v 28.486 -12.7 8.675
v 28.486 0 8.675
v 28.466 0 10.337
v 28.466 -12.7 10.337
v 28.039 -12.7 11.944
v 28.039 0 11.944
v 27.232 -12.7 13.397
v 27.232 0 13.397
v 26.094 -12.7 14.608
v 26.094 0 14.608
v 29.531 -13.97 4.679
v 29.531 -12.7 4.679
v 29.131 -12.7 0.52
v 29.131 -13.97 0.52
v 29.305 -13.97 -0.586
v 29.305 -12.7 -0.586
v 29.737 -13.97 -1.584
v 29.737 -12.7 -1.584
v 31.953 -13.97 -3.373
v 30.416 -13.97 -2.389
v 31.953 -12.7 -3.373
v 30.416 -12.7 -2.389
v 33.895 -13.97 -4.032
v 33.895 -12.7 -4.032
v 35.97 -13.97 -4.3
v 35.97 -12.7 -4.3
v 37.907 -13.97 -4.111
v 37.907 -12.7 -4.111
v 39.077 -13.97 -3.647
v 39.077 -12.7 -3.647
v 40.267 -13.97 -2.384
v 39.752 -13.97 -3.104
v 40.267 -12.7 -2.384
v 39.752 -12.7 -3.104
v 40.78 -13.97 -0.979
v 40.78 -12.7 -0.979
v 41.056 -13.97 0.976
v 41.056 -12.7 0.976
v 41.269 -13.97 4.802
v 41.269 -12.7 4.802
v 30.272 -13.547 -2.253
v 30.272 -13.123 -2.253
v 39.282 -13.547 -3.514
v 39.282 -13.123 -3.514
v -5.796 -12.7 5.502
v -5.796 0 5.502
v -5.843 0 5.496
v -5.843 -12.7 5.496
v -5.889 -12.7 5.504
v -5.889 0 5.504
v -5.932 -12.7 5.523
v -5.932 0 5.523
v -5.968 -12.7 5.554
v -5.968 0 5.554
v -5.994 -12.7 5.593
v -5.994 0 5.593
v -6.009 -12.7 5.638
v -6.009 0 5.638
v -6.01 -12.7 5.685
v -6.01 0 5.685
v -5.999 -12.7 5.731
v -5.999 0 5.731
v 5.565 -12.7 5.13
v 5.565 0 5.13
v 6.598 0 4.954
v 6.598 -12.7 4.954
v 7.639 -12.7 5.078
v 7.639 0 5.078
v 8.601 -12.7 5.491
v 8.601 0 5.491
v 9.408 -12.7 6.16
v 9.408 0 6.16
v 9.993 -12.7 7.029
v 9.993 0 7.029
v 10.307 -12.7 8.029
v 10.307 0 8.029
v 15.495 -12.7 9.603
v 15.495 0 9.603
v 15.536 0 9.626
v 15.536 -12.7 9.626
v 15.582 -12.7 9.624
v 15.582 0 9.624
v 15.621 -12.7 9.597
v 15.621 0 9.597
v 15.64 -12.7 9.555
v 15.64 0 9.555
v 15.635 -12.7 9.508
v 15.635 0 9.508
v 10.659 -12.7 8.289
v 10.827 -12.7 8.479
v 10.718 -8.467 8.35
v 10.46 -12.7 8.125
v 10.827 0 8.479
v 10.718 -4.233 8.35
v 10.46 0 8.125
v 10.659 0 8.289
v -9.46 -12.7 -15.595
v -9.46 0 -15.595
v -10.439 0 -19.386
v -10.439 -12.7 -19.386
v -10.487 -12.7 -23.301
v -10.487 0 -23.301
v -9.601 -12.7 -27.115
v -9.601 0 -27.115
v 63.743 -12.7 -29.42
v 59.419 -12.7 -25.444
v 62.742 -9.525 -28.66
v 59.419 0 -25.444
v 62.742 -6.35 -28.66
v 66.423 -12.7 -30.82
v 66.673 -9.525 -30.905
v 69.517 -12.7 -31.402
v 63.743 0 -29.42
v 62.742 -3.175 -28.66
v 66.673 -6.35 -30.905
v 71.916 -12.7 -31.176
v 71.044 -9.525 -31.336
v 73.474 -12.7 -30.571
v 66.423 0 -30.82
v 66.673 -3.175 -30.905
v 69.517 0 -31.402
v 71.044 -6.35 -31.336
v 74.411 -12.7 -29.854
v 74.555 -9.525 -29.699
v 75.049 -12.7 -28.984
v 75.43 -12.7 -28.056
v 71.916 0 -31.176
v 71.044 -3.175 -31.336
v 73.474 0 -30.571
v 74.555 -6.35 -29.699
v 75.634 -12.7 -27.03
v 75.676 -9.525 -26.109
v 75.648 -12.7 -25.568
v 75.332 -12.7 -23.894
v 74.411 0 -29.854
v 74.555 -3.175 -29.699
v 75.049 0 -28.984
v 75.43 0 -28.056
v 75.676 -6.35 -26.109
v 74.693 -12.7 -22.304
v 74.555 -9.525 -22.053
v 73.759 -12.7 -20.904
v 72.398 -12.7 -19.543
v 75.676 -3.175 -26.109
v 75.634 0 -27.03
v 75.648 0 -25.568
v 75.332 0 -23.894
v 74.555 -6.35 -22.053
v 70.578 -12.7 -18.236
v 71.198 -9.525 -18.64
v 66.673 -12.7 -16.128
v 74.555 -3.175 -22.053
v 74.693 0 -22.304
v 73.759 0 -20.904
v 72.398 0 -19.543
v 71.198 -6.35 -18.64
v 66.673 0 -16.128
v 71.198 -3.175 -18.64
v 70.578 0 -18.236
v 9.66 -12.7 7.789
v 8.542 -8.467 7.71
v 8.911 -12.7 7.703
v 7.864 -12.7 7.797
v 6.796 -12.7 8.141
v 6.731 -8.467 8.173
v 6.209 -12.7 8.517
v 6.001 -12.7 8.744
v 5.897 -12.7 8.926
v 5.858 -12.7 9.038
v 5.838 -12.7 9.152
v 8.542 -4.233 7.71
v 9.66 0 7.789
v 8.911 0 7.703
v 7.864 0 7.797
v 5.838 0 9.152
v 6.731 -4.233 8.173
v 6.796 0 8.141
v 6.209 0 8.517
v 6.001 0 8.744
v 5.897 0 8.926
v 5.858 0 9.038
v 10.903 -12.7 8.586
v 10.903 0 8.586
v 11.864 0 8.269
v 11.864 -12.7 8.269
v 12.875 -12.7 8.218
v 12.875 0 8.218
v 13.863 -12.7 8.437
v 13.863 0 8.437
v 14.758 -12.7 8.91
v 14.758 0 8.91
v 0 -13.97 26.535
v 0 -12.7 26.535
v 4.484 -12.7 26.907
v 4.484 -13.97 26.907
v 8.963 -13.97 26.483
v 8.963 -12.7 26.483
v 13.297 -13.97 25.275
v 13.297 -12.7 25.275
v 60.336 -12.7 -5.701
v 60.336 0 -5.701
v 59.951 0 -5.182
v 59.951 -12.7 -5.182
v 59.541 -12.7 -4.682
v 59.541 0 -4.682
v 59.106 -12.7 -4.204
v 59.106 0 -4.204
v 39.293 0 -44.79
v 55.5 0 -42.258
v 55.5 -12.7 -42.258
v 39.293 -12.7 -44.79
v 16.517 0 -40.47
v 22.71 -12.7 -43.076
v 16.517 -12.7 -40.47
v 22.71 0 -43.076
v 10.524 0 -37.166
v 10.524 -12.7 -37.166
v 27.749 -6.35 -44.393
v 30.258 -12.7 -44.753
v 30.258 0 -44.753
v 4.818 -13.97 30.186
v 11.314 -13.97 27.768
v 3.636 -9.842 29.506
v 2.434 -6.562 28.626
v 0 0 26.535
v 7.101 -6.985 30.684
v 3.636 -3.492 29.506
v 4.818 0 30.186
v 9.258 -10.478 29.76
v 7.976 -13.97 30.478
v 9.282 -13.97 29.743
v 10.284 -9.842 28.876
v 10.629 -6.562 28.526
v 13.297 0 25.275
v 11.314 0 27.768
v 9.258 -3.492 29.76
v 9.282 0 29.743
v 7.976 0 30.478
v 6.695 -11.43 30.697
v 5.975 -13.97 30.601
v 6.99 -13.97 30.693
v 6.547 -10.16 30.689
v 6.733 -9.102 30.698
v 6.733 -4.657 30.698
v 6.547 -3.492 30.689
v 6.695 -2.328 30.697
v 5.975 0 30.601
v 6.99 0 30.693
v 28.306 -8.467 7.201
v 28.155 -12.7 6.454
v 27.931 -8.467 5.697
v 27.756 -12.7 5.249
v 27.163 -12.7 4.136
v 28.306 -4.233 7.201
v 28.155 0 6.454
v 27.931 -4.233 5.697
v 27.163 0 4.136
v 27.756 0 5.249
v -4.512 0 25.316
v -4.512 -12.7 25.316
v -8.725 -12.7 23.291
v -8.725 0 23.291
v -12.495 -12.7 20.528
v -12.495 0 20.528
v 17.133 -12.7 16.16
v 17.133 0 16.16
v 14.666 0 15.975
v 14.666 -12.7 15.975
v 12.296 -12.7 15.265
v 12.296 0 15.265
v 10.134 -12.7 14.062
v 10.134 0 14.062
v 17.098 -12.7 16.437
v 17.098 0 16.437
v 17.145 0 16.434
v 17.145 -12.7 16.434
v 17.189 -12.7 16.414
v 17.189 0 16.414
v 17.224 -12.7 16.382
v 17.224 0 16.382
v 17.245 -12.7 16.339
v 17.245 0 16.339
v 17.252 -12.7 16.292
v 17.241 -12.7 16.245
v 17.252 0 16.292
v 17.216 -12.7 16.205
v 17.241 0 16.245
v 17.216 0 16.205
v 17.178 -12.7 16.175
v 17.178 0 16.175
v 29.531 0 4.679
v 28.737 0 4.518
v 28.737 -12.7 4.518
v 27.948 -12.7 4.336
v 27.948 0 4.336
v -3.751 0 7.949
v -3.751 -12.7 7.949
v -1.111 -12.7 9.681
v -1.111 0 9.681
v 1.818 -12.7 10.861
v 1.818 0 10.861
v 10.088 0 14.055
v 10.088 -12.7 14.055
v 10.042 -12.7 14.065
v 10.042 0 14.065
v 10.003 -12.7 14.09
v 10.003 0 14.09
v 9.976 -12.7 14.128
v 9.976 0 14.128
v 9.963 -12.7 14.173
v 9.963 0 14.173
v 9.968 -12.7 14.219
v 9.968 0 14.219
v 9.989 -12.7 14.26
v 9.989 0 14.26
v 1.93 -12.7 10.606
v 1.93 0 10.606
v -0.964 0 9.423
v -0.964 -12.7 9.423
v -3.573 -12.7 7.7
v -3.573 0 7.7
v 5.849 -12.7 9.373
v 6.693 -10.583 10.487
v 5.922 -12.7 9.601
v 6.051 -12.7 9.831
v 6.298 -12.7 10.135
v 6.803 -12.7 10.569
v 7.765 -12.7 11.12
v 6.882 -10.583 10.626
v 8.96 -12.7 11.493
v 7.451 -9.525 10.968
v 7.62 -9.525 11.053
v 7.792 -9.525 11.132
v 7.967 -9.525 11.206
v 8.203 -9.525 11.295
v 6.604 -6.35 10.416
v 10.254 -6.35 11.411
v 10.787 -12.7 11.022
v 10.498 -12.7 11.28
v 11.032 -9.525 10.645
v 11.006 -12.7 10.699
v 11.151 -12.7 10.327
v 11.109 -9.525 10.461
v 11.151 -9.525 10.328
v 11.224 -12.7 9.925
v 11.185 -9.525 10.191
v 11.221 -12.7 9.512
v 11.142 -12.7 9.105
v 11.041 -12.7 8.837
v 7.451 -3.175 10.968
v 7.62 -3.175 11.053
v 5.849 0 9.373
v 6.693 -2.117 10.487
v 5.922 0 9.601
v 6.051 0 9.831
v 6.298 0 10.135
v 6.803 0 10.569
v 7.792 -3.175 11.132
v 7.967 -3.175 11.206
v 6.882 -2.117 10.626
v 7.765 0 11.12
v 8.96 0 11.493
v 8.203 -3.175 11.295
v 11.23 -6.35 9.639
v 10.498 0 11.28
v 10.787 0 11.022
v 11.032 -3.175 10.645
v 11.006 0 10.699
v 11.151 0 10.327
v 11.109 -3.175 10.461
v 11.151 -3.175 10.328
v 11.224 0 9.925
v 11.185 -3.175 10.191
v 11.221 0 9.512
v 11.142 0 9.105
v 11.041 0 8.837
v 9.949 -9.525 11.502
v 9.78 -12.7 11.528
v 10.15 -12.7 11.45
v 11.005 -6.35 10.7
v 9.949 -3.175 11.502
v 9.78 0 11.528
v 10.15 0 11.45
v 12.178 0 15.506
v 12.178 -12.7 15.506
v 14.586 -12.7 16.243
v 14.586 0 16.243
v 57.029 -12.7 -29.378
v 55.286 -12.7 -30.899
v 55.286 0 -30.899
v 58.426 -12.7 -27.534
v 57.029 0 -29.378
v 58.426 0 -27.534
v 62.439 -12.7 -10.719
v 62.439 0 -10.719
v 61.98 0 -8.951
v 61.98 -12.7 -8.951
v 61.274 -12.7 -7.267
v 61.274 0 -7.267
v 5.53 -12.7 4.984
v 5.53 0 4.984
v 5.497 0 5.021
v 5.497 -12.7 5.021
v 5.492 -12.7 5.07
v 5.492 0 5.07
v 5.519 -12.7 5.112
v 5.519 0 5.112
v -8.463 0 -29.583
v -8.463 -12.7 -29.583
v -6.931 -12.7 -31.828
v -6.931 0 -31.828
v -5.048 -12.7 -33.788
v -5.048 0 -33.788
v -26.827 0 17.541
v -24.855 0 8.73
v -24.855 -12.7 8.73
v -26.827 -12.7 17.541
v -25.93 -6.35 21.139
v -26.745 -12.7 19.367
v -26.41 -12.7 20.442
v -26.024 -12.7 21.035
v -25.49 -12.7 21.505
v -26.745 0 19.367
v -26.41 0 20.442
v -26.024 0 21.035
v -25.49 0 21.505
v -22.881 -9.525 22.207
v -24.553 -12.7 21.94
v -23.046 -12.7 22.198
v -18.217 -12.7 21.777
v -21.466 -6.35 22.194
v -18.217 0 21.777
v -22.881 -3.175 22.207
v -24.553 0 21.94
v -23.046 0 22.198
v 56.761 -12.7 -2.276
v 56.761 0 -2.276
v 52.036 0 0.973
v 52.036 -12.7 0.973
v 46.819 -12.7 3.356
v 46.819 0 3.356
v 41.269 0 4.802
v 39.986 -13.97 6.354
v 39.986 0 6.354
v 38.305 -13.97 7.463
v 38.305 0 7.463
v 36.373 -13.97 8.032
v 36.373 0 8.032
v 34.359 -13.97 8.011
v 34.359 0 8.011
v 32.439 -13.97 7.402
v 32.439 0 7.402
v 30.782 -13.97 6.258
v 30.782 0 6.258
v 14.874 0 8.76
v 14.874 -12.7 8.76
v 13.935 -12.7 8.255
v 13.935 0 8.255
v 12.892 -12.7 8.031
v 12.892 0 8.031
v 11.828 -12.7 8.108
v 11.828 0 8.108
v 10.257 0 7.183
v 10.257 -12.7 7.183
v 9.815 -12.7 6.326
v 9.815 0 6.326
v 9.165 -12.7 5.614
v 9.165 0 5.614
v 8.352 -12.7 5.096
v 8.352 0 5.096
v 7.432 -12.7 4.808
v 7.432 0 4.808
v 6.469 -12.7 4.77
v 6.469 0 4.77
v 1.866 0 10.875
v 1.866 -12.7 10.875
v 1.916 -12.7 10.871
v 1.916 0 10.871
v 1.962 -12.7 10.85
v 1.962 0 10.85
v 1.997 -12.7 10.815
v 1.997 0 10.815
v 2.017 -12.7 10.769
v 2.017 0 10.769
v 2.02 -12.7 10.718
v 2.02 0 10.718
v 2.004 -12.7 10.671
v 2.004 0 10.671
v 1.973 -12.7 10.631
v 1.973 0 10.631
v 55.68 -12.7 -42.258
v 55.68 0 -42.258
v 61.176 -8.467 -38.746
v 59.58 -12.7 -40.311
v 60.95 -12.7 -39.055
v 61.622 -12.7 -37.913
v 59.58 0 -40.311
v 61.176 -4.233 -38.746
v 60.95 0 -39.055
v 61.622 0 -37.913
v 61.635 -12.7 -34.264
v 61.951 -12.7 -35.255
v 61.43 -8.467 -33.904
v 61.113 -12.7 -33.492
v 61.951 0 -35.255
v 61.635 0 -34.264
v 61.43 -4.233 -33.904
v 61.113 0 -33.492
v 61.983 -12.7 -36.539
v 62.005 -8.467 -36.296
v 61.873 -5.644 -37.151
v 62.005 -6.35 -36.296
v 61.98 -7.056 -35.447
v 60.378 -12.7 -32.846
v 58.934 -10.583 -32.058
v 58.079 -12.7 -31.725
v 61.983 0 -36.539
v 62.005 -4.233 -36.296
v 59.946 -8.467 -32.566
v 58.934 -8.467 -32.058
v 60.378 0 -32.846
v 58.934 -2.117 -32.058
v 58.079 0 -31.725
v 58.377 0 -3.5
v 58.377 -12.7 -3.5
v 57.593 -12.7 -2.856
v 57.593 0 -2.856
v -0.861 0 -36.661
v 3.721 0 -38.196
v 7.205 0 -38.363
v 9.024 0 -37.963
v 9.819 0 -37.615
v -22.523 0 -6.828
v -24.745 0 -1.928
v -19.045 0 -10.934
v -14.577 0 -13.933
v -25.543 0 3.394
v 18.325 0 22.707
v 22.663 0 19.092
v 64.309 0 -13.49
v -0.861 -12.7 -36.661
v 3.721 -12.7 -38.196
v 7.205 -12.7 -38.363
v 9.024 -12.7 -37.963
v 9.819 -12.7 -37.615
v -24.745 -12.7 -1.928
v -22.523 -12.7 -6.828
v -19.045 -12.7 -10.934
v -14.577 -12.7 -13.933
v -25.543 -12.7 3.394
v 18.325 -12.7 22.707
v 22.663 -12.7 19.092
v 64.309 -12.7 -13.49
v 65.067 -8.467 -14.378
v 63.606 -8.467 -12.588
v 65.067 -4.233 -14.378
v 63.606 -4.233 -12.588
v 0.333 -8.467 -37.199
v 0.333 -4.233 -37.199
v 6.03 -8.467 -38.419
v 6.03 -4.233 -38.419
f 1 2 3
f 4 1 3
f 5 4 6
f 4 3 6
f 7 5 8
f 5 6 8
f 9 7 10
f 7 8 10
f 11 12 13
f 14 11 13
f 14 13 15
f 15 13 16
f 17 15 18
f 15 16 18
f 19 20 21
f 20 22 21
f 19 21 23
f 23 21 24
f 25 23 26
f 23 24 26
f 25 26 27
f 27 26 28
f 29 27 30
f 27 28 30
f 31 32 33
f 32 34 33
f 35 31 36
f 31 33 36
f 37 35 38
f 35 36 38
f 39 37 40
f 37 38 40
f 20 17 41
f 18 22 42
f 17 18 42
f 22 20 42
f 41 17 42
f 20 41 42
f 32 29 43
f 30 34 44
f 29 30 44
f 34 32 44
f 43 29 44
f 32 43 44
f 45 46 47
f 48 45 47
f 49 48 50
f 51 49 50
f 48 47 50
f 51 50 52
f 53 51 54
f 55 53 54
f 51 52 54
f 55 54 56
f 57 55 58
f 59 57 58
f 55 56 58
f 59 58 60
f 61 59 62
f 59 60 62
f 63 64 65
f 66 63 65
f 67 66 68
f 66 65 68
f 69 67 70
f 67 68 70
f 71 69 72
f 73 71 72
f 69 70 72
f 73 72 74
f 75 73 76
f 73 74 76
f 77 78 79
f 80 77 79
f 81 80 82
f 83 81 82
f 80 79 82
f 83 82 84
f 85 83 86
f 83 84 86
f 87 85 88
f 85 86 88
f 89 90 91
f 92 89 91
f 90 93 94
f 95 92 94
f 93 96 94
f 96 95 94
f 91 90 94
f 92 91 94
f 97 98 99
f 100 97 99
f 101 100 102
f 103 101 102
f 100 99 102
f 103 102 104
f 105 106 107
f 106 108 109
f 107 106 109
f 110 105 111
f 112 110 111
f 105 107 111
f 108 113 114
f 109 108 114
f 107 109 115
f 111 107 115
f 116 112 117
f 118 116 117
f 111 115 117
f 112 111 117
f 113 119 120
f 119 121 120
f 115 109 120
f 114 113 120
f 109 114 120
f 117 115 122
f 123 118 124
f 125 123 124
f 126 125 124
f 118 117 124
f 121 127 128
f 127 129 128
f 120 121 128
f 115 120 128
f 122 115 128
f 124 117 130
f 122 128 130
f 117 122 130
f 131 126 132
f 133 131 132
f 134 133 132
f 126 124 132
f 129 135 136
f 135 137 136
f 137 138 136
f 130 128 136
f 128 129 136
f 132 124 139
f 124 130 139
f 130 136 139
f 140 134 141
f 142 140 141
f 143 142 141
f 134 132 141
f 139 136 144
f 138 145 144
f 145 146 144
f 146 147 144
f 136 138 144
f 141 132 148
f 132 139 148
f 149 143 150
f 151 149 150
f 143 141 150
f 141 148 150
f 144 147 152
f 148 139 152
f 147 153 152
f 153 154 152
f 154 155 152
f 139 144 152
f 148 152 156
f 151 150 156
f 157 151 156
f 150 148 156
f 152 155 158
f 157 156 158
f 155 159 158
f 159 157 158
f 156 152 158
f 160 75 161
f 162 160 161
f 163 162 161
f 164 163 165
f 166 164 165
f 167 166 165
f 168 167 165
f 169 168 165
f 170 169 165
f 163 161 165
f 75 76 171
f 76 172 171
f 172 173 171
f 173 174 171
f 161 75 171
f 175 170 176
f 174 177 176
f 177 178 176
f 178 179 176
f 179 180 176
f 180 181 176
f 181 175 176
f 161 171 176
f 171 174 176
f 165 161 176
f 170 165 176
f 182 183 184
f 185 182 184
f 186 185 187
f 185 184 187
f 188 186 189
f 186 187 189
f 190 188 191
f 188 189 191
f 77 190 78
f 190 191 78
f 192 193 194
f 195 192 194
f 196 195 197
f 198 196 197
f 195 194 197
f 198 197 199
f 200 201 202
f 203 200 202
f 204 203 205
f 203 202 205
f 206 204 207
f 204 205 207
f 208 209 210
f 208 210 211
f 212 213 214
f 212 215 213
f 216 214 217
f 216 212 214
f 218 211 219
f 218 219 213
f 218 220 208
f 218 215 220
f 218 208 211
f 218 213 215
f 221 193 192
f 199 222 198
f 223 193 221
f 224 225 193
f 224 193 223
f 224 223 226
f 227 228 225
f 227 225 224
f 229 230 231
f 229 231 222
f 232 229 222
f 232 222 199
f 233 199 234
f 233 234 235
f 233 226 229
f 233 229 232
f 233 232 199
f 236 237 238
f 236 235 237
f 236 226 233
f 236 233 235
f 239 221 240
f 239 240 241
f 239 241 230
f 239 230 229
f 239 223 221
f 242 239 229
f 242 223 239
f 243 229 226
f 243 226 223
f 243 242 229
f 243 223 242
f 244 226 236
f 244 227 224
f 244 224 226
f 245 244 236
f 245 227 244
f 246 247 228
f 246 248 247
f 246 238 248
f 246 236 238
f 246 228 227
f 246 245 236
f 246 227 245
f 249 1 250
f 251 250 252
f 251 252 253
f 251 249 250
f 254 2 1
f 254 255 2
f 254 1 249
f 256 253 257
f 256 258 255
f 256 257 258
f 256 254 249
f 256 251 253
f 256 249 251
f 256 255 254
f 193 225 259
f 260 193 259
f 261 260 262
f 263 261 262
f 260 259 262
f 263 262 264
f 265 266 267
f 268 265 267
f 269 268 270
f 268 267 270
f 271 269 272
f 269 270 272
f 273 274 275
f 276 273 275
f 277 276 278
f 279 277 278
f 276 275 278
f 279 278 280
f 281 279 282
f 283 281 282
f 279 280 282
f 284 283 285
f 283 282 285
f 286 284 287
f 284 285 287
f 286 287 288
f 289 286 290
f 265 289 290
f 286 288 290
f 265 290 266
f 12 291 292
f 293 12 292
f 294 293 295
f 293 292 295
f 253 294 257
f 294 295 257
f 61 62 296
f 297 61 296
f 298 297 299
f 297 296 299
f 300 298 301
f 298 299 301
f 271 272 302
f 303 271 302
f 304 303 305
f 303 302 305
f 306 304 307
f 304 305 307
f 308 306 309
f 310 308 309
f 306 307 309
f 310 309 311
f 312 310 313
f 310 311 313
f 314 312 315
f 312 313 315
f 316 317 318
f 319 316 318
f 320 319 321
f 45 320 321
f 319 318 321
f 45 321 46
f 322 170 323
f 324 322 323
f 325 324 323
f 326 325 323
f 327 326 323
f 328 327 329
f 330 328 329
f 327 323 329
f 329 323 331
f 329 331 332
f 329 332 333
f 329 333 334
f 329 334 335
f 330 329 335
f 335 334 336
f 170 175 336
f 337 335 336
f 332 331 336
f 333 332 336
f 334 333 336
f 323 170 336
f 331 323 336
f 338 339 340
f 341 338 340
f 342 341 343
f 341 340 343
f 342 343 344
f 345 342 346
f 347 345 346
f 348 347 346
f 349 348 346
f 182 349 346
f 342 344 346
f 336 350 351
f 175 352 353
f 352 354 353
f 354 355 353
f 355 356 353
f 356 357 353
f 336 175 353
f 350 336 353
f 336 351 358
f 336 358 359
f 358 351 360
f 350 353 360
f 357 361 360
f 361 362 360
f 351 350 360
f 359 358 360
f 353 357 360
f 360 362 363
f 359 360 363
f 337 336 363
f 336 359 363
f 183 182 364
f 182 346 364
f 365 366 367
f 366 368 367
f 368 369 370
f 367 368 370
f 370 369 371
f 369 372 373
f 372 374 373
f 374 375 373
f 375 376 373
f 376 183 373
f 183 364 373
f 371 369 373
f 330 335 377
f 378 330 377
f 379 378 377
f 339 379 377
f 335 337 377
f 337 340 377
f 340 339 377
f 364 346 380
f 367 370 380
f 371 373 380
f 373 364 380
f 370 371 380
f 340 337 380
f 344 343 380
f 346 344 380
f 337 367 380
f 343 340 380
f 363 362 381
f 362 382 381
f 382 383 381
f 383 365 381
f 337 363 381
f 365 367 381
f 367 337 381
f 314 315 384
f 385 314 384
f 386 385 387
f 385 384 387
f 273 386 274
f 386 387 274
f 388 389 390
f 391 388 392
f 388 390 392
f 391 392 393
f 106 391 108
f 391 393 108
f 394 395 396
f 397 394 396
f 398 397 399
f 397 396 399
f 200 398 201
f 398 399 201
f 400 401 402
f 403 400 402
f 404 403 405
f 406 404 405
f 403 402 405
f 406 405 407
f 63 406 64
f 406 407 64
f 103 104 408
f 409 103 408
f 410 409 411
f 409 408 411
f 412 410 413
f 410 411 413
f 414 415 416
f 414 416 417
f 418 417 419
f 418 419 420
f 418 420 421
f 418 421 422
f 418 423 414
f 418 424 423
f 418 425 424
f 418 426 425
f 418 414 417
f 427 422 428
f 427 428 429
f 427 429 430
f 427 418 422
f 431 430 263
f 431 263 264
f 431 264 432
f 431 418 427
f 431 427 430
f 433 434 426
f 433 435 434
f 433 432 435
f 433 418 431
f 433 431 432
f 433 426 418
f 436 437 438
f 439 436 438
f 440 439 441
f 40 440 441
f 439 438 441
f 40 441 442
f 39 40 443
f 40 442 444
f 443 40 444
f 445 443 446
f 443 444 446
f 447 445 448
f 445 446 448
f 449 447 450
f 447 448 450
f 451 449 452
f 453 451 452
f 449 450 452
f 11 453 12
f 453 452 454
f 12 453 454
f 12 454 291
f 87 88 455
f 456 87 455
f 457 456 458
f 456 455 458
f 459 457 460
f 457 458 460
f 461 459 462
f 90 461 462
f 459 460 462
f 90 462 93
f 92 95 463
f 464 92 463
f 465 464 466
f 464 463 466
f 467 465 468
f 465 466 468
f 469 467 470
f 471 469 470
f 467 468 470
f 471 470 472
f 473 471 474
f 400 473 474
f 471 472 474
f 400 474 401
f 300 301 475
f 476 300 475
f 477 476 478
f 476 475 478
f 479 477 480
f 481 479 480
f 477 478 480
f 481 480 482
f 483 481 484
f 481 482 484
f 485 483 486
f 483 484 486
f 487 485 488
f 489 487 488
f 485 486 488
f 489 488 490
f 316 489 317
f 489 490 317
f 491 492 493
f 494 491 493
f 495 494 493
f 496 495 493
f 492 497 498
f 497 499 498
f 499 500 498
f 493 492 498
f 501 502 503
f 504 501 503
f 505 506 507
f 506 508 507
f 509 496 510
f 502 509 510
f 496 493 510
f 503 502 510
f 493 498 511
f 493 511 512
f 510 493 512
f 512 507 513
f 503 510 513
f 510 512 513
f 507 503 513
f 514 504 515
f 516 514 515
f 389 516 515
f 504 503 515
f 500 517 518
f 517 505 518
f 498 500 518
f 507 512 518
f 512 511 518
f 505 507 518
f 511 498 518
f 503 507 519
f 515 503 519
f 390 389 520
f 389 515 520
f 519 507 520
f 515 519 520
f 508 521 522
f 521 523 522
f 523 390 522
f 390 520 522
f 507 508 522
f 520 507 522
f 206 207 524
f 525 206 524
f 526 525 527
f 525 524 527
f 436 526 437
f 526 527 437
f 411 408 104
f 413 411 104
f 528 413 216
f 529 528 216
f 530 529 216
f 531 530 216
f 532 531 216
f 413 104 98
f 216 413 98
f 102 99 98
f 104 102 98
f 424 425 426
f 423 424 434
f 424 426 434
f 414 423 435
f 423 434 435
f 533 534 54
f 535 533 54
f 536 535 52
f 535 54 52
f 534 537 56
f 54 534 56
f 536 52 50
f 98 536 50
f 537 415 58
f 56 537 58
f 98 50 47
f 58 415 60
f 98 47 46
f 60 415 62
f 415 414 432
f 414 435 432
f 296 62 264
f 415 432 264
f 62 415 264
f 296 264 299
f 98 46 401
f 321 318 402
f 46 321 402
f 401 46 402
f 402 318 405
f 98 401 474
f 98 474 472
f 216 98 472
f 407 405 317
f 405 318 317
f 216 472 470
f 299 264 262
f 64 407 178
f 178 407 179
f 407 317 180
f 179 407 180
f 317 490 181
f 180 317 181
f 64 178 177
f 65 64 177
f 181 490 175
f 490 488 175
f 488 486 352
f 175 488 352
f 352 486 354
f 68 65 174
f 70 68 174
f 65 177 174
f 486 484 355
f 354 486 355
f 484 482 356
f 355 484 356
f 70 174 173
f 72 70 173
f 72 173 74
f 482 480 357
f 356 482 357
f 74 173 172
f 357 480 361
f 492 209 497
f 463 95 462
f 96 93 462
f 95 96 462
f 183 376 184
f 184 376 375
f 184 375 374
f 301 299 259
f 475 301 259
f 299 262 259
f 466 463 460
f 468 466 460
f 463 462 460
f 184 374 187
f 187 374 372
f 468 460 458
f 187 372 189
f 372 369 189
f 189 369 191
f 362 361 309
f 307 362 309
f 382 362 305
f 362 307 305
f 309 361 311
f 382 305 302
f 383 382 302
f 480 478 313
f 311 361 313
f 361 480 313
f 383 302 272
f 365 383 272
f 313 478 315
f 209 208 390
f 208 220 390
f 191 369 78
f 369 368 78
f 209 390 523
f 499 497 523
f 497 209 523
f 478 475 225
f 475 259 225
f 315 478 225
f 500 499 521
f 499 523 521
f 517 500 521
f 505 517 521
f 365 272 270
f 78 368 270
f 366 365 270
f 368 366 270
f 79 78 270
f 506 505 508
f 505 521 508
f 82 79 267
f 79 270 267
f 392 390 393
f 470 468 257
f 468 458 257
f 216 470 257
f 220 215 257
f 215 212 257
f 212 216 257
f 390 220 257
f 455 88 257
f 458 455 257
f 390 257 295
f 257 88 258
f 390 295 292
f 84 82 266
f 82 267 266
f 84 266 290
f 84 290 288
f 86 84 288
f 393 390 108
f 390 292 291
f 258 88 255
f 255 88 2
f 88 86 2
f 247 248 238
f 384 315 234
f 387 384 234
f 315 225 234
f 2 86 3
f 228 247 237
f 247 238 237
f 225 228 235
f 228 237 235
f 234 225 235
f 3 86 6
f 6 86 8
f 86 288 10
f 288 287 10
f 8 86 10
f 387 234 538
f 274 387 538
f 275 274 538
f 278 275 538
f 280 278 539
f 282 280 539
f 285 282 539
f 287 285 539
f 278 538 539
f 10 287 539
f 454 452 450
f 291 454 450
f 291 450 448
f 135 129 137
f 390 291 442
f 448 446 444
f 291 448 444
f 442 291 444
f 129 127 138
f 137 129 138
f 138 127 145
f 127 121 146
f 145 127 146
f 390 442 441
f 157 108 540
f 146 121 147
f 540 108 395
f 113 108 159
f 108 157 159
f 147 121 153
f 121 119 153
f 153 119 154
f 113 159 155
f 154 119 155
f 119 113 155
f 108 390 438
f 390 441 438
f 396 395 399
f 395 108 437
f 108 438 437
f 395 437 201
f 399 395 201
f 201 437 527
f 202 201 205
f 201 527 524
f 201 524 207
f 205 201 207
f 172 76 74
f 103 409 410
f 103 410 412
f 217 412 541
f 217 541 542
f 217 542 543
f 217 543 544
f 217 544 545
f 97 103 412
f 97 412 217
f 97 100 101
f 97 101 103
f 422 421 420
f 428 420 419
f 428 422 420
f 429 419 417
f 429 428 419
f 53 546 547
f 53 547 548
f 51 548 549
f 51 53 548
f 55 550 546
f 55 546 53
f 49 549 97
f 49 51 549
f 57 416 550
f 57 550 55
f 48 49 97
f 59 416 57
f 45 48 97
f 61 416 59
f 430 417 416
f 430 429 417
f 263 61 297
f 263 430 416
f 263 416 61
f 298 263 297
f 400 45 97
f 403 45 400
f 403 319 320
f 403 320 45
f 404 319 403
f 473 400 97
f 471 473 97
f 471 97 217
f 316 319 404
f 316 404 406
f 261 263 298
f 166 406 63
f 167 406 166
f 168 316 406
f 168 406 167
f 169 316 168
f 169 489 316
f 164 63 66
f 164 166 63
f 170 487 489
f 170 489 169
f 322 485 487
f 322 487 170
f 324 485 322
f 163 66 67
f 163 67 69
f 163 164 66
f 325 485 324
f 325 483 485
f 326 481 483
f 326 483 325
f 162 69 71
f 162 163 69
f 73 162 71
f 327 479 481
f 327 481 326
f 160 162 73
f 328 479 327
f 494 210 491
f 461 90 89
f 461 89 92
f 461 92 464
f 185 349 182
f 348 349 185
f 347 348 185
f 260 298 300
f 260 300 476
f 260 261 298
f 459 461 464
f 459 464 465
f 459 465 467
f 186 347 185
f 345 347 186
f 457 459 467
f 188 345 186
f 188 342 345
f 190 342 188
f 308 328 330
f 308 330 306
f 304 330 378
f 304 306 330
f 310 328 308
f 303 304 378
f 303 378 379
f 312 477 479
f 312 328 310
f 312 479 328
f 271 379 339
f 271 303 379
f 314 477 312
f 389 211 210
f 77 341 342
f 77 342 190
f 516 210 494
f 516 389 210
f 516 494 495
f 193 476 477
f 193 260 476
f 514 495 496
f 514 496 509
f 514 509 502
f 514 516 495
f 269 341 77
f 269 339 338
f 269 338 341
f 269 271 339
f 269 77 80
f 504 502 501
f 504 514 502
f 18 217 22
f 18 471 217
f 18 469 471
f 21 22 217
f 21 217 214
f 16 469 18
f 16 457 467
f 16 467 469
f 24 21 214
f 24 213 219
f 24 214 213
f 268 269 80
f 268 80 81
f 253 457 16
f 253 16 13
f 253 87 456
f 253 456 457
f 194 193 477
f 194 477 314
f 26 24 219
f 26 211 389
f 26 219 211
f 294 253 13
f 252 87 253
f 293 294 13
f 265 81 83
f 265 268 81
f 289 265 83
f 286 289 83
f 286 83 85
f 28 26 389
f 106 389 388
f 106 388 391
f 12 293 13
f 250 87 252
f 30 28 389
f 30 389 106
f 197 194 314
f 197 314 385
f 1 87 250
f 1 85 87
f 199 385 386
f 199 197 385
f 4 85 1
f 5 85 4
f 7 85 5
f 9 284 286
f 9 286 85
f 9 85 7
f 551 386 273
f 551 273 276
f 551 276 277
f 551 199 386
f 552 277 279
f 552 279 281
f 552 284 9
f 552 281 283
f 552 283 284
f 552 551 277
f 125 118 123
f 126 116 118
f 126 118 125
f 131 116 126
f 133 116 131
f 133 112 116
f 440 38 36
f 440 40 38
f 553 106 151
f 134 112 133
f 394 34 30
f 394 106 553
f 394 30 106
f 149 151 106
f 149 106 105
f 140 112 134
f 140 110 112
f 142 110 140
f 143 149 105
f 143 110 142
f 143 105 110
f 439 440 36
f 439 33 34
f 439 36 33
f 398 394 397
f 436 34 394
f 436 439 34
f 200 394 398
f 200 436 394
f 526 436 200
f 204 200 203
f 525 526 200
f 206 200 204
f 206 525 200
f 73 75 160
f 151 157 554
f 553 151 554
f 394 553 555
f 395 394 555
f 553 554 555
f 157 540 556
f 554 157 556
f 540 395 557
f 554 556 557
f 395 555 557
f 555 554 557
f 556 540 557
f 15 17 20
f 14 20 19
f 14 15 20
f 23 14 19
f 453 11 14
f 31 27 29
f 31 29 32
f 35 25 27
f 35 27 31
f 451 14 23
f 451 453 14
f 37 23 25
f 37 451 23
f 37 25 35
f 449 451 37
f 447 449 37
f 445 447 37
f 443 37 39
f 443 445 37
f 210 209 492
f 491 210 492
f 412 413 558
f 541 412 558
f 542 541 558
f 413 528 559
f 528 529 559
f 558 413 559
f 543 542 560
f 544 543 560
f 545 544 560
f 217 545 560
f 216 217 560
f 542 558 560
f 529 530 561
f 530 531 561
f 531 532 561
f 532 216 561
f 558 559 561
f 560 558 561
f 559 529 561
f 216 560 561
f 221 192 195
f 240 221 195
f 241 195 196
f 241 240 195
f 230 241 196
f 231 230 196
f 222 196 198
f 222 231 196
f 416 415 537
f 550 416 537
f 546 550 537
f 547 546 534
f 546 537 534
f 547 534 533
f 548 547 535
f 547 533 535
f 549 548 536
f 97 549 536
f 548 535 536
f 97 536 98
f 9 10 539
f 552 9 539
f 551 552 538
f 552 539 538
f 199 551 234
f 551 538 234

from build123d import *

# Parameters (mm, degrees)
F1_DEPTH = 12.7
F2_DEPTH = 13.97


with BuildPart() as f1:
    # F0 (on Front) → F1 (new body)
    with BuildSketch(Plane.XZ):
        with BuildLine():
            add(Edge.make_bspline(
                [(59.1061716019, -4.2043621835), (58.3953510036, -3.510707878), (57.5753379472, -2.8959754481), (56.7613643321, -2.276264629)],
                knots=[0.8131179307, 0.8131179307, 0.8131179307, 0.8131179307, 1, 1, 1, 1], degree=3))
            ThreePointArc((56.7613643321, -2.276264629), (49.4791419592, 2.277986697), (41.2694336671, 4.8023990217))
            add(Edge.make_bspline(
                [(29.5313251719, 4.6794850926), (29.1414100604, 1.9221812865), (27.9308180864, -3.4101647296), (41.8323133175, -5.906469104), (40.9844336777, 1.749254351), (41.2694336671, 4.8023990217)],
                knots=[0, 0, 0, 0, 0.1570486005, 0.3364582627, 0.510386675, 0.510386675, 0.510386675, 0.510386675], degree=3))
            ThreePointArc((29.5313251719, 4.6794850926), (28.3420191938, 4.4292771407), (27.1627145152, 4.1355200917))
            add(Edge.make_bspline(
                [(28.4860077977, 8.6753729454), (28.3390382985, 7.2053221936), (28.1920687992, 5.7352714419), (27.1627145152, 4.1355200917)],
                knots=[0, 0, 0, 0, 0.3706313521, 0.3706313521, 0.3706313521, 0.3706313521], degree=3))
            ThreePointArc((28.4860077977, 8.6753729454), (28.0391099274, 11.9438353715), (26.0936398085, 14.6079882112))
            ThreePointArc((26.0936398085, 14.6079882112), (20.5948318097, 21.0205895609), (13.2967198545, 25.2745180236))
            ThreePointArc((13.2967198545, 25.2745180236), (6.7327034589, 26.7945457305), (0, 26.5347388693))
            ThreePointArc((0, 26.5347388693), (-6.6651341425, 24.4005933469), (-12.4945323914, 20.5280352384))
            add(Edge.make_bspline(
                [(-24.8554814607, 8.7302317843), (-26.3582845919, 13.9286221672), (-29.4227370154, 24.5289594145), (-18.2090454728, 21.878641168), (-12.4945323914, 20.5280352384)],
                knots=[0, 0, 0, 0, 0.4903985847, 1, 1, 1, 1], degree=3))
            ThreePointArc((-24.8554814607, 8.7302317843), (-22.5230177273, -6.8283307763), (-9.4597768039, -15.5953709036))
            ThreePointArc((-9.4597768039, -15.5953709036), (-10.5806893026, -21.3422223383), (-9.6007177755, -27.1147782755))
            add(Edge.make_bspline(
                [(-9.6007177755, -27.1147782755), (-8.5647365316, -29.5135595921), (-7.0556106981, -31.9100860204), (-5.0480626523, -33.7880067527)],
                knots=[0.2832101572, 0.2832101572, 0.2832101572, 0.2832101572, 0.3975900868, 0.3975900868, 0.3975900868, 0.3975900868], degree=3))
            add(Edge.make_bspline(
                [(-5.0480626523, -33.7880067527), (-0.3306821613, -38.2007861357), (7.1388179474, -39.7499994998), (10.5236132672, -37.1664466075)],
                knots=[0.3975900868, 0.3975900868, 0.3975900868, 0.3975900868, 0.6663625578, 0.6663625578, 0.6663625578, 0.6663625578], degree=3))
            add(Edge.make_bspline(
                [(55.5000454187, -42.2575362027), (45.9227569206, -44.1077921969), (29.534223499, -47.2739265579), (16.0171883325, -40.4395783324), (10.5236132672, -37.1664466075)],
                knots=[0, 0, 0, 0, 0.5131163927, 0.8780381998, 0.8780381998, 0.8780381998, 0.8780381998], degree=3))
            Line((55.5000454187, -42.2575362027), (55.6802488863, -42.2575362027))
            add(Edge.make_bspline(
                [(55.6802488863, -42.2575362027), (57.8649319172, -41.3421819694), (61.933363626, -39.6375611457), (62.5441736967, -32.9275500123), (57.8690689466, -31.5816055418), (55.2858944788, -30.8987696483)],
                knots=[0, 0, 0, 0, 0.3430550385, 0.6388551459, 0.9830517596, 0.9830517596, 0.9830517596, 0.9830517596], degree=3))
            ThreePointArc((55.2858944788, -30.8987696483), (57.774796408, -28.4914379114), (59.4194548829, -25.4443118219))
            add(Edge.make_bspline(
                [(59.4194548829, -25.4443118219), (61.5668623777, -27.6961704589), (65.7267940312, -32.0584435934), (76.3421290349, -31.3246256264), (75.736400422, -20.6626458704), (69.8191952556, -17.7023380158), (66.6726157069, -16.128141433)],
                knots=[0, 0, 0, 0, 0.2566051025, 0.4970922803, 0.7325698364, 1, 1, 1, 1], degree=3))
            add(Edge.make_bspline(
                [(66.6726157069, -16.128141433), (65.0447675311, -14.3832892567), (63.4100748942, -12.6418994745), (62.438506633, -10.718587786)],
                knots=[0, 0, 0, 0, 0.3651247136, 0.3651247136, 0.3651247136, 0.3651247136], degree=3))
            add(Edge.make_bspline(
                [(62.438506633, -10.718587786), (61.5739147936, -9.0070460887), (61.2344575356, -7.1514386813), (60.3355277859, -5.7014262697)],
                knots=[0.3651247136, 0.3651247136, 0.3651247136, 0.3651247136, 0.6900466571, 0.6900466571, 0.6900466571, 0.6900466571], degree=3))
            ThreePointArc((60.3355277859, -5.7014262697), (59.7492819423, -4.929546288), (59.1061716019, -4.2043621835))
        make_face()
        with BuildLine():
            ThreePointArc((-5.9990617447, 5.7310229167), (-2.4740959169, 8.8804908185), (1.8180131447, 10.8609786257))
            ThreePointArc((1.8180131447, 10.8609786257), (2.0089152962, 10.7924724578), (1.9302222129, 10.60553898))
            ThreePointArc((1.9302222129, 10.60553898), (-2.3105141336, 8.6258077241), (-5.79586206, 5.5024232715))
            ThreePointArc((-5.79586206, 5.5024232715), (-5.9682689093, 5.5537835324), (-5.9990617447, 5.7310229167))
        make_face(mode=Mode.SUBTRACT)
        with BuildLine():
            add(Edge.make_bspline(
                [(10.3070973536, 8.028651153), (8.8878162788, 7.2321778462), (5.9498321238, 8.001992808), (5.8378027752, 9.1516999528)],
                knots=[0.6626685216, 0.6626685216, 0.6626685216, 0.6626685216, 1, 1, 1, 1], degree=3))
            add(Edge.make_bspline(
                [(5.8378027752, 9.1516999528), (5.7188398768, 10.3725630212), (10.8860088037, 13.1505736904), (11.5140866455, 9.5170493858), (10.9034565546, 8.586031805)],
                knots=[0, 0, 0, 0, 0.3582090845, 0.6033763358, 0.6033763358, 0.6033763358, 0.6033763358], degree=3))
            ThreePointArc((10.9034565546, 8.586031805), (13.3764537584, 8.2942058615), (15.4947527988, 9.6032844405))
            ThreePointArc((15.4947527988, 9.6032844405), (15.6035241906, 9.6130970285), (15.6345004432, 9.5083689314))
            ThreePointArc((15.6345004432, 9.5083689314), (13.4210728493, 8.1059221778), (10.8274193225, 8.4788564786))
            add(Edge.make_bspline(
                [(10.8274193225, 8.4788564786), (10.7248464569, 8.3450423002), (10.6024036816, 8.2251174819), (10.4596894234, 8.1246141344)],
                knots=[0.6130144256, 0.6130144256, 0.6130144256, 0.6130144256, 0.6500567437, 0.6500567437, 0.6500567437, 0.6500567437], degree=3))
            ThreePointArc((10.4596894234, 8.1246141344), (8.7756345565, 5.3284277831), (5.5296770297, 4.9842495724))
            ThreePointArc((5.5296770297, 4.9842495724), (5.4924518419, 5.0703022397), (5.5651250629, 5.1295422522))
            ThreePointArc((5.5651250629, 5.1295422522), (8.601479146, 5.4907773493), (10.3070973536, 8.028651153))
        make_face(mode=Mode.SUBTRACT)
        with BuildLine():
            ThreePointArc((9.9886422977, 14.2604736611), (13.3617809031, 15.9412203037), (17.0977395028, 16.4367873222))
            ThreePointArc((17.0977395028, 16.4367873222), (17.2505331806, 16.3157218017), (17.1331140203, 16.16010847))
            ThreePointArc((17.1331140203, 16.16010847), (13.4617569094, 15.6841100404), (10.1337671161, 14.0624067764))
            ThreePointArc((10.1337671161, 14.0624067764), (9.9877830492, 14.1076437209), (9.9886422977, 14.2604736611))
        make_face(mode=Mode.SUBTRACT)
        with BuildLine():
            ThreePointArc((59.1061716019, -4.2043621835), (57.9912746912, -3.1703780522), (56.7613643321, -2.276264629))
            add(Edge.make_bspline(
                [(59.1061716019, -4.2043621835), (58.3953510036, -3.510707878), (57.5753379472, -2.8959754481), (56.7613643321, -2.276264629)],
                knots=[0.8131179307, 0.8131179307, 0.8131179307, 0.8131179307, 1, 1, 1, 1], degree=3))
        make_face()
        with BuildLine():
            ThreePointArc((62.438506633, -10.718587786), (61.657325801, -8.0967052638), (60.3355277859, -5.7014262697))
            add(Edge.make_bspline(
                [(62.438506633, -10.718587786), (61.5739147936, -9.0070460887), (61.2344575356, -7.1514386813), (60.3355277859, -5.7014262697)],
                knots=[0.3651247136, 0.3651247136, 0.3651247136, 0.3651247136, 0.6900466571, 0.6900466571, 0.6900466571, 0.6900466571], degree=3))
        make_face()
        with BuildLine():
            ThreePointArc((-9.6007177755, -27.1147782755), (-7.7438934974, -30.7375888851), (-5.0480626523, -33.7880067527))
            add(Edge.make_bspline(
                [(-9.6007177755, -27.1147782755), (-8.5647365316, -29.5135595921), (-7.0556106981, -31.9100860204), (-5.0480626523, -33.7880067527)],
                knots=[0.2832101572, 0.2832101572, 0.2832101572, 0.2832101572, 0.3975900868, 0.3975900868, 0.3975900868, 0.3975900868], degree=3))
        make_face()
    extrude(amount=F1_DEPTH)

    # F0 (on Front) → F2 (join)
    with BuildSketch(Plane.XZ):
        with BuildLine():
            add(Edge.make_bspline(
                [(29.5313251719, 4.6794850926), (29.1414100604, 1.9221812865), (27.9308180864, -3.4101647296), (41.8323133175, -5.906469104), (40.9844336777, 1.749254351), (41.2694336671, 4.8023990217)],
                knots=[0, 0, 0, 0, 0.1570486005, 0.3364582627, 0.510386675, 0.510386675, 0.510386675, 0.510386675], degree=3))
            ThreePointArc((41.2694336671, 4.8023990217), (35.3652424418, 8.0964743323), (29.5313251719, 4.6794850926))
        make_face()
        with BuildLine():
            ThreePointArc((0, 26.5347388693), (6.7327034589, 26.7945457305), (13.2967198545, 25.2745180236))
            add(Edge.make_bspline(
                [(0, 26.5347388693), (2.4426200797, 28.7145279713), (7.327860239, 33.0741061753), (11.3070999826, 27.8743807408), (13.2967198545, 25.2745180236)],
                knots=[0, 0, 0, 0, 0.5, 1, 1, 1, 1], degree=3))
        make_face()
    extrude(amount=F2_DEPTH)


solid = f1.part
